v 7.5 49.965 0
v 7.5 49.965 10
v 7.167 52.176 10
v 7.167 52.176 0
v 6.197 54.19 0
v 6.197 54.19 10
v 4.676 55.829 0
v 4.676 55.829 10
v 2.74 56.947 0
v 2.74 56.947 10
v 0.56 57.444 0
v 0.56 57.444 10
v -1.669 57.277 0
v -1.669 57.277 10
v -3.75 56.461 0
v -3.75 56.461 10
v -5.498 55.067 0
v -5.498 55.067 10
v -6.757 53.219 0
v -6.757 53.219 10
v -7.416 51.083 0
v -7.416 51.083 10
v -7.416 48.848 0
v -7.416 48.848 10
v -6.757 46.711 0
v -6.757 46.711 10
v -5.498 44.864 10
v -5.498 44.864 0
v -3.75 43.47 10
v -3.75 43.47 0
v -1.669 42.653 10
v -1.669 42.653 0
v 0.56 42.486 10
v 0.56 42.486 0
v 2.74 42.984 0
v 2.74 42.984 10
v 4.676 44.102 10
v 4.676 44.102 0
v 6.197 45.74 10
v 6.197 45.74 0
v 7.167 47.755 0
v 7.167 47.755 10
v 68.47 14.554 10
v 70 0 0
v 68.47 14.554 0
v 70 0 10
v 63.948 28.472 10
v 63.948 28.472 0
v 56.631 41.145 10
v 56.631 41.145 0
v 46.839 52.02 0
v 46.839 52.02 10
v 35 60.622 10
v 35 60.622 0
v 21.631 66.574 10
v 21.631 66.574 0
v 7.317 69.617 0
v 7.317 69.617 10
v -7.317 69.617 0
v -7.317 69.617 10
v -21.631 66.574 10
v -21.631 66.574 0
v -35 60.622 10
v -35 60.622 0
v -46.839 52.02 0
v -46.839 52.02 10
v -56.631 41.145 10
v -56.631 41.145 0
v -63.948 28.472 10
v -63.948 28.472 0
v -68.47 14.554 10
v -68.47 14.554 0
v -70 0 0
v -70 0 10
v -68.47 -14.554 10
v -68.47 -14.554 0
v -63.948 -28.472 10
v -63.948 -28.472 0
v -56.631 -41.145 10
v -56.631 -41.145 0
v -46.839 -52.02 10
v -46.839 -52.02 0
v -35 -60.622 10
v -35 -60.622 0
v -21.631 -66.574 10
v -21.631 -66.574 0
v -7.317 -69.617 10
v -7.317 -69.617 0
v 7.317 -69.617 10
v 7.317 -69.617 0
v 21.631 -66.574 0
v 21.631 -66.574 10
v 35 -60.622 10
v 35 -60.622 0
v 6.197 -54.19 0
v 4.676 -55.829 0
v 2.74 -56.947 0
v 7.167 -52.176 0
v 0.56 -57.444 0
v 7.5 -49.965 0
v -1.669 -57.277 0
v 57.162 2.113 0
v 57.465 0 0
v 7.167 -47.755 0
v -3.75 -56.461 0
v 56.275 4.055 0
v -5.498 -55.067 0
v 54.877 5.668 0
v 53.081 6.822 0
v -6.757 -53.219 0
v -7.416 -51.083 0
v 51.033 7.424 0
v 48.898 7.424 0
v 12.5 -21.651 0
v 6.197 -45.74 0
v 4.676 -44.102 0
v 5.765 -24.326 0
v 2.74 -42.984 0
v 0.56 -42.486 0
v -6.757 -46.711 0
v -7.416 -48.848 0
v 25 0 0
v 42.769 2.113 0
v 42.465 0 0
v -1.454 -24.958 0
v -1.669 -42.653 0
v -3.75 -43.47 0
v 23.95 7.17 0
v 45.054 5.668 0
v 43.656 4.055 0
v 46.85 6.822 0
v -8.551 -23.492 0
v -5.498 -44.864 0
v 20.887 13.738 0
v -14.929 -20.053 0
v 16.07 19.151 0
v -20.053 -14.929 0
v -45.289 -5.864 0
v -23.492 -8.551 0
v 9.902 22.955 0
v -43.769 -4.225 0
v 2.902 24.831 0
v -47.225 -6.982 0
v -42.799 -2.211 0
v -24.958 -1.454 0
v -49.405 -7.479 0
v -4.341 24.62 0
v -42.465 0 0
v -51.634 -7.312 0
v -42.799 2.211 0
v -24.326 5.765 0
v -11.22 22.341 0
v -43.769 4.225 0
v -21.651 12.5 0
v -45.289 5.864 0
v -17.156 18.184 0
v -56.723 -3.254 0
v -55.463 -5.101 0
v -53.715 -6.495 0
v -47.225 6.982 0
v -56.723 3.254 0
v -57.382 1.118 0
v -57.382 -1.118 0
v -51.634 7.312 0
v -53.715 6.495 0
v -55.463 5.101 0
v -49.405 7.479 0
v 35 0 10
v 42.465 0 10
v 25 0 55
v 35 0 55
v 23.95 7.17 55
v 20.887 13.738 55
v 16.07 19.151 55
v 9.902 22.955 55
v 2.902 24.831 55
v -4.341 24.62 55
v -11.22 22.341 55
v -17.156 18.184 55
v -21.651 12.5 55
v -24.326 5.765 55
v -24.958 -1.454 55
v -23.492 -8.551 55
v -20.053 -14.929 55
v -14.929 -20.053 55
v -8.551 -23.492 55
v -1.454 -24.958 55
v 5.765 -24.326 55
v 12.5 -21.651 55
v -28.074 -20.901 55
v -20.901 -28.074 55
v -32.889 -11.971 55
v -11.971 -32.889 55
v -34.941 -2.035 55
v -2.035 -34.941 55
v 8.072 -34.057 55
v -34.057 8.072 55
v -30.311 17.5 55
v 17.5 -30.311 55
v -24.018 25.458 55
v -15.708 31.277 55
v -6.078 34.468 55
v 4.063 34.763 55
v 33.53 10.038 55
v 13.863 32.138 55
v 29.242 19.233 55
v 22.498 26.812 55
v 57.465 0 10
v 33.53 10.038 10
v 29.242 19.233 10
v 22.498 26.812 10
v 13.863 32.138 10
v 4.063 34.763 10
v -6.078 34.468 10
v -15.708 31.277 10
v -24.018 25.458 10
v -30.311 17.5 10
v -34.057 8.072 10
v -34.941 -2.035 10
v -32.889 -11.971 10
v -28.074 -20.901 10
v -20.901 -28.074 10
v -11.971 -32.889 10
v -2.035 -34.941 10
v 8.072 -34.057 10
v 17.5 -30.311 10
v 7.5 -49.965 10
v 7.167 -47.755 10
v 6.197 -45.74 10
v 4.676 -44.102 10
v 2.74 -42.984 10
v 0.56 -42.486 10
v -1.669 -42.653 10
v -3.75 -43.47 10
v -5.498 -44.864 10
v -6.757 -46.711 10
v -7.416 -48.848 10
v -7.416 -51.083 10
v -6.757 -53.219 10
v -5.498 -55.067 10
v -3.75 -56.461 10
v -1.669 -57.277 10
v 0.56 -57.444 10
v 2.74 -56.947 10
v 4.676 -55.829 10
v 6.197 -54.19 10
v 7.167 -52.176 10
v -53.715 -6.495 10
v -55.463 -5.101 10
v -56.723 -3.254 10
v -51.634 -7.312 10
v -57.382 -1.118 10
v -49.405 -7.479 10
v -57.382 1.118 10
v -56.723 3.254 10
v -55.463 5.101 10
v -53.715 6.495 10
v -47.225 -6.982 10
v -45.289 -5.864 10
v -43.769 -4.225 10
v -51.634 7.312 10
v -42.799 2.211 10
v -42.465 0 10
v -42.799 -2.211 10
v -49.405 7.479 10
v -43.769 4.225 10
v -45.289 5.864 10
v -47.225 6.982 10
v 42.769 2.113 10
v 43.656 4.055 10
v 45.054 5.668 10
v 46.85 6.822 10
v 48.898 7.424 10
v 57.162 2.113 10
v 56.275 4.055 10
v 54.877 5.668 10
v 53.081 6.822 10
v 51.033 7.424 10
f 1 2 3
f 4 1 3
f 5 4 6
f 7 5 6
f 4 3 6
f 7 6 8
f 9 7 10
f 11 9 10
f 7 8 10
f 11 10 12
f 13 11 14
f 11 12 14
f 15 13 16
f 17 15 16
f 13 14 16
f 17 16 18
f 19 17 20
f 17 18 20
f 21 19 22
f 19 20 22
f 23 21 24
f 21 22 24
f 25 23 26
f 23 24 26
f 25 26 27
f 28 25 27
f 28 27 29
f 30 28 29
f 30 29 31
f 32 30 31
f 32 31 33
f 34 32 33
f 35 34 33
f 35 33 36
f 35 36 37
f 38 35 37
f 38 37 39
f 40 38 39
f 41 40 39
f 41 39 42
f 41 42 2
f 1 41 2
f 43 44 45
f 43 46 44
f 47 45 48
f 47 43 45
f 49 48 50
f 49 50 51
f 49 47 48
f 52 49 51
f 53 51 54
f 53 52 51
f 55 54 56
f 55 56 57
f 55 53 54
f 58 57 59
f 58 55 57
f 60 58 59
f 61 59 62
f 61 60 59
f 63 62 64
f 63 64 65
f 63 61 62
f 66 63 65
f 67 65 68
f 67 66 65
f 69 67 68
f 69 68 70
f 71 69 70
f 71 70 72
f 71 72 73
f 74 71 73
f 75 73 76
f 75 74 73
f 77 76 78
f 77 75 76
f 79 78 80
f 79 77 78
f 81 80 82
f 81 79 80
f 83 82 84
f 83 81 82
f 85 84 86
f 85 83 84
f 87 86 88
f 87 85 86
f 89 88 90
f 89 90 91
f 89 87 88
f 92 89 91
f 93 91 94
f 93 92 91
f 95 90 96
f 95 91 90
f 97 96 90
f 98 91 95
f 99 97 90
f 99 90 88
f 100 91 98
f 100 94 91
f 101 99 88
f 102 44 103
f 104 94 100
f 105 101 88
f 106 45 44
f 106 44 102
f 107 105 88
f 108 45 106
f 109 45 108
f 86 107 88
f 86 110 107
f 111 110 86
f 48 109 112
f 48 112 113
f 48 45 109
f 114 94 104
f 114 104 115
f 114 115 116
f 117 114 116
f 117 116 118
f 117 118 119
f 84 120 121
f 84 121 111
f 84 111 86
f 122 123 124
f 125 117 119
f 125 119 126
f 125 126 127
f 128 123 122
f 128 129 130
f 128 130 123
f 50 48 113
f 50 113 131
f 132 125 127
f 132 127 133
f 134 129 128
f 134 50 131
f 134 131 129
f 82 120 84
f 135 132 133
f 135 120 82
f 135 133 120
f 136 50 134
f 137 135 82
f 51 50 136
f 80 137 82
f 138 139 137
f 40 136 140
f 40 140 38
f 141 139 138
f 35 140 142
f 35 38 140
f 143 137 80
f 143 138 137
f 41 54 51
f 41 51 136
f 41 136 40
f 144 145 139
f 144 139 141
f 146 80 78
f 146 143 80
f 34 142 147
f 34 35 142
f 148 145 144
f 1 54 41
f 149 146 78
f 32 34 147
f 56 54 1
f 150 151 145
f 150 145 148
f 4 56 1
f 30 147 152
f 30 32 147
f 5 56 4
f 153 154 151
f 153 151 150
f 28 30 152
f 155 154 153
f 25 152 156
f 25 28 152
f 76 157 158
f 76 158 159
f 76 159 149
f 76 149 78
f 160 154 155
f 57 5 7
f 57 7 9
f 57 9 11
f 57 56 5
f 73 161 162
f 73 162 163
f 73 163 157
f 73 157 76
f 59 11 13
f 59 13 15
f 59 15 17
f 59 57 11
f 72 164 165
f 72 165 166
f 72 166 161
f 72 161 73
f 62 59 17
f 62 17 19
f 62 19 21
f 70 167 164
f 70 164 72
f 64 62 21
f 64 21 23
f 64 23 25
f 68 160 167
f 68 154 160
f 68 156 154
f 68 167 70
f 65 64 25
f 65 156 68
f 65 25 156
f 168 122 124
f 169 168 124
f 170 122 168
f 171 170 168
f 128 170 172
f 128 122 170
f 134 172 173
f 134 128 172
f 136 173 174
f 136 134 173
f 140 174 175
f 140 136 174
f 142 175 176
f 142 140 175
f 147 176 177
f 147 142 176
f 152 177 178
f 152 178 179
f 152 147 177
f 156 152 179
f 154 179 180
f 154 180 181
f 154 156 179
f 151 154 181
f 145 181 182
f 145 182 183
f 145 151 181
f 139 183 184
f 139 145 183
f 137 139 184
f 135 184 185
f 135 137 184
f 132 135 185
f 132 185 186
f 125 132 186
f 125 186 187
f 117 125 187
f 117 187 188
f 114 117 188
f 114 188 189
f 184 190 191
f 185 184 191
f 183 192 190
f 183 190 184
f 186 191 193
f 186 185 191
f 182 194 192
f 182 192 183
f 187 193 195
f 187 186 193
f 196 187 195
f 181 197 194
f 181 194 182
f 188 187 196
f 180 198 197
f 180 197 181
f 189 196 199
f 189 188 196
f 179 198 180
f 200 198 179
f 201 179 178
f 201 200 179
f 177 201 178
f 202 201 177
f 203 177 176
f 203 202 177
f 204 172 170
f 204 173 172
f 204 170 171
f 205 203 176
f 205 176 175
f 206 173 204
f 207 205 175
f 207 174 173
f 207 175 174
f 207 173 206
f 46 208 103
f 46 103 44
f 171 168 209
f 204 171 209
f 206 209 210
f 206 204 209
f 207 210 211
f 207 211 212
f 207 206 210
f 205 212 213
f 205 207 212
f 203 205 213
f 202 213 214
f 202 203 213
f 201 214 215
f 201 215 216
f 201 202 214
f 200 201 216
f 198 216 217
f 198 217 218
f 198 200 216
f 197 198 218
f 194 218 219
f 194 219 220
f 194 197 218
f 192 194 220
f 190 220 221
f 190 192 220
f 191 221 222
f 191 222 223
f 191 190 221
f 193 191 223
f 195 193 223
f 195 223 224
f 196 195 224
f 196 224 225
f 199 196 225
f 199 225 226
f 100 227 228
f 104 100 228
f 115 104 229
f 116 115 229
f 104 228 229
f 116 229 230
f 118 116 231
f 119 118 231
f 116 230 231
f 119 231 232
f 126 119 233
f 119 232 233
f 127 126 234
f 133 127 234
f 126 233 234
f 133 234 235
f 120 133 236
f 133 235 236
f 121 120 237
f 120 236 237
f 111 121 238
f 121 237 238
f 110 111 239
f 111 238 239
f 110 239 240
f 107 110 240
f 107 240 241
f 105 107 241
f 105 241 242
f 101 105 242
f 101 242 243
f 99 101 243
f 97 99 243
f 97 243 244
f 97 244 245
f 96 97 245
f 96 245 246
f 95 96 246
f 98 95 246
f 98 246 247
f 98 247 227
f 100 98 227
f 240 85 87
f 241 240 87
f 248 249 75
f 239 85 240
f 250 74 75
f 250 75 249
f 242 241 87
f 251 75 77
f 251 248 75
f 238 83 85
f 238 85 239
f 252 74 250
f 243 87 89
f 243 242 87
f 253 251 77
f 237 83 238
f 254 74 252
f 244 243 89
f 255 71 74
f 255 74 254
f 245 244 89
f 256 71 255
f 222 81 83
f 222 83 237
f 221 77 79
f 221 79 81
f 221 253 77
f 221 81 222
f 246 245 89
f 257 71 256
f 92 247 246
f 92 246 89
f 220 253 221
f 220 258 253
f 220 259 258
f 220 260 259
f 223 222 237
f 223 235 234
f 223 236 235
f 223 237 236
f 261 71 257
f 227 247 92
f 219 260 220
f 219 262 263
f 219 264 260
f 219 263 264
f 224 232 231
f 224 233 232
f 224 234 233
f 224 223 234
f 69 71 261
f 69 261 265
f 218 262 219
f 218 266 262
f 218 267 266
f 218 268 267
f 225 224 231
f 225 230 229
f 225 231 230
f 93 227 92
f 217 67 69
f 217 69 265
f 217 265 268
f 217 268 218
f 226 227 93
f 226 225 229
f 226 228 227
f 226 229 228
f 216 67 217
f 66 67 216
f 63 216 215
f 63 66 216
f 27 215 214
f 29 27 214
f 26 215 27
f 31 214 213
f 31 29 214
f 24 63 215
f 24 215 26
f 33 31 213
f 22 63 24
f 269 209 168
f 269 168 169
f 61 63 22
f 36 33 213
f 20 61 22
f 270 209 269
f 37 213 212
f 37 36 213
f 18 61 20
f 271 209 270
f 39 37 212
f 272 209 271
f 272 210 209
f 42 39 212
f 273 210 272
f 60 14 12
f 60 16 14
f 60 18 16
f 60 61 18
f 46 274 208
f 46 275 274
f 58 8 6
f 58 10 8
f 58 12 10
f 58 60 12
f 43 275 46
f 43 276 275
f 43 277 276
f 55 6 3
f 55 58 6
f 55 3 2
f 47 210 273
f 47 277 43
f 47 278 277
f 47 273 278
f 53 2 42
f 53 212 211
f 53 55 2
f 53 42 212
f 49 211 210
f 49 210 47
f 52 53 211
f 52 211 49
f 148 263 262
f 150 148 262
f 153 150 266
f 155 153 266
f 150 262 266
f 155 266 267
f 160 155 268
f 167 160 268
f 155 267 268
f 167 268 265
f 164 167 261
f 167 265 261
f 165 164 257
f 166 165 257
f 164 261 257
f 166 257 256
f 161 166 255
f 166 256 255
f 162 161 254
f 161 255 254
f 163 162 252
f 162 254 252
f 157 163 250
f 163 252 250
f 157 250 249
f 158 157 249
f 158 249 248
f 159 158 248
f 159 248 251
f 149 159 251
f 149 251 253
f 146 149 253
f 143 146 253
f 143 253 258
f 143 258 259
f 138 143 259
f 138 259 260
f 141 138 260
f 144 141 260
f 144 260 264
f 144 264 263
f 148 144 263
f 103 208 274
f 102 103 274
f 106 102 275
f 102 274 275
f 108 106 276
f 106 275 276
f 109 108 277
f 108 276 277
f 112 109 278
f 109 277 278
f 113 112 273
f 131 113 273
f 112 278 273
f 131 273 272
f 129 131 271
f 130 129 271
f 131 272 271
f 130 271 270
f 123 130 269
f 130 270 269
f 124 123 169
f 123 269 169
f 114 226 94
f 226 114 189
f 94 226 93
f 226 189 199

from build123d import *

# Parameters (mm, degrees)
F1_ANGLE = 300
F2_R     = 7.5
F3_DEPTH = 10.001


with BuildPart() as f1:
    # F0 (on Front) → F1 (revolve)
    with BuildSketch(Plane.XZ):
        Polygon((35, 55), (25, 55), (25, 0), (70, 0), (70, 10), (35, 10), align=None)
    revolve(axis=Axis((0, 0, 30.149998), (0, 0, 1)), revolution_arc=F1_ANGLE)

    # F2 (on face) → F3 (cut, through all)
    with BuildSketch(Plane.XY.offset(10)):
        with BuildLine():
            Line((42.465329, 0), (57.465329, 0))
            ThreePointArc((57.465329, 0), (49.965329, 7.5), (42.465329, 0))
        make_face()
        with Locations((0, 49.965329)):
            Circle(F2_R)
        with Locations((-49.965329, 0)):
            Circle(F2_R)
        with Locations((0, -49.965329)):
            Circle(F2_R)
    extrude(amount=-F3_DEPTH, mode=Mode.SUBTRACT)


solid = f1.part
